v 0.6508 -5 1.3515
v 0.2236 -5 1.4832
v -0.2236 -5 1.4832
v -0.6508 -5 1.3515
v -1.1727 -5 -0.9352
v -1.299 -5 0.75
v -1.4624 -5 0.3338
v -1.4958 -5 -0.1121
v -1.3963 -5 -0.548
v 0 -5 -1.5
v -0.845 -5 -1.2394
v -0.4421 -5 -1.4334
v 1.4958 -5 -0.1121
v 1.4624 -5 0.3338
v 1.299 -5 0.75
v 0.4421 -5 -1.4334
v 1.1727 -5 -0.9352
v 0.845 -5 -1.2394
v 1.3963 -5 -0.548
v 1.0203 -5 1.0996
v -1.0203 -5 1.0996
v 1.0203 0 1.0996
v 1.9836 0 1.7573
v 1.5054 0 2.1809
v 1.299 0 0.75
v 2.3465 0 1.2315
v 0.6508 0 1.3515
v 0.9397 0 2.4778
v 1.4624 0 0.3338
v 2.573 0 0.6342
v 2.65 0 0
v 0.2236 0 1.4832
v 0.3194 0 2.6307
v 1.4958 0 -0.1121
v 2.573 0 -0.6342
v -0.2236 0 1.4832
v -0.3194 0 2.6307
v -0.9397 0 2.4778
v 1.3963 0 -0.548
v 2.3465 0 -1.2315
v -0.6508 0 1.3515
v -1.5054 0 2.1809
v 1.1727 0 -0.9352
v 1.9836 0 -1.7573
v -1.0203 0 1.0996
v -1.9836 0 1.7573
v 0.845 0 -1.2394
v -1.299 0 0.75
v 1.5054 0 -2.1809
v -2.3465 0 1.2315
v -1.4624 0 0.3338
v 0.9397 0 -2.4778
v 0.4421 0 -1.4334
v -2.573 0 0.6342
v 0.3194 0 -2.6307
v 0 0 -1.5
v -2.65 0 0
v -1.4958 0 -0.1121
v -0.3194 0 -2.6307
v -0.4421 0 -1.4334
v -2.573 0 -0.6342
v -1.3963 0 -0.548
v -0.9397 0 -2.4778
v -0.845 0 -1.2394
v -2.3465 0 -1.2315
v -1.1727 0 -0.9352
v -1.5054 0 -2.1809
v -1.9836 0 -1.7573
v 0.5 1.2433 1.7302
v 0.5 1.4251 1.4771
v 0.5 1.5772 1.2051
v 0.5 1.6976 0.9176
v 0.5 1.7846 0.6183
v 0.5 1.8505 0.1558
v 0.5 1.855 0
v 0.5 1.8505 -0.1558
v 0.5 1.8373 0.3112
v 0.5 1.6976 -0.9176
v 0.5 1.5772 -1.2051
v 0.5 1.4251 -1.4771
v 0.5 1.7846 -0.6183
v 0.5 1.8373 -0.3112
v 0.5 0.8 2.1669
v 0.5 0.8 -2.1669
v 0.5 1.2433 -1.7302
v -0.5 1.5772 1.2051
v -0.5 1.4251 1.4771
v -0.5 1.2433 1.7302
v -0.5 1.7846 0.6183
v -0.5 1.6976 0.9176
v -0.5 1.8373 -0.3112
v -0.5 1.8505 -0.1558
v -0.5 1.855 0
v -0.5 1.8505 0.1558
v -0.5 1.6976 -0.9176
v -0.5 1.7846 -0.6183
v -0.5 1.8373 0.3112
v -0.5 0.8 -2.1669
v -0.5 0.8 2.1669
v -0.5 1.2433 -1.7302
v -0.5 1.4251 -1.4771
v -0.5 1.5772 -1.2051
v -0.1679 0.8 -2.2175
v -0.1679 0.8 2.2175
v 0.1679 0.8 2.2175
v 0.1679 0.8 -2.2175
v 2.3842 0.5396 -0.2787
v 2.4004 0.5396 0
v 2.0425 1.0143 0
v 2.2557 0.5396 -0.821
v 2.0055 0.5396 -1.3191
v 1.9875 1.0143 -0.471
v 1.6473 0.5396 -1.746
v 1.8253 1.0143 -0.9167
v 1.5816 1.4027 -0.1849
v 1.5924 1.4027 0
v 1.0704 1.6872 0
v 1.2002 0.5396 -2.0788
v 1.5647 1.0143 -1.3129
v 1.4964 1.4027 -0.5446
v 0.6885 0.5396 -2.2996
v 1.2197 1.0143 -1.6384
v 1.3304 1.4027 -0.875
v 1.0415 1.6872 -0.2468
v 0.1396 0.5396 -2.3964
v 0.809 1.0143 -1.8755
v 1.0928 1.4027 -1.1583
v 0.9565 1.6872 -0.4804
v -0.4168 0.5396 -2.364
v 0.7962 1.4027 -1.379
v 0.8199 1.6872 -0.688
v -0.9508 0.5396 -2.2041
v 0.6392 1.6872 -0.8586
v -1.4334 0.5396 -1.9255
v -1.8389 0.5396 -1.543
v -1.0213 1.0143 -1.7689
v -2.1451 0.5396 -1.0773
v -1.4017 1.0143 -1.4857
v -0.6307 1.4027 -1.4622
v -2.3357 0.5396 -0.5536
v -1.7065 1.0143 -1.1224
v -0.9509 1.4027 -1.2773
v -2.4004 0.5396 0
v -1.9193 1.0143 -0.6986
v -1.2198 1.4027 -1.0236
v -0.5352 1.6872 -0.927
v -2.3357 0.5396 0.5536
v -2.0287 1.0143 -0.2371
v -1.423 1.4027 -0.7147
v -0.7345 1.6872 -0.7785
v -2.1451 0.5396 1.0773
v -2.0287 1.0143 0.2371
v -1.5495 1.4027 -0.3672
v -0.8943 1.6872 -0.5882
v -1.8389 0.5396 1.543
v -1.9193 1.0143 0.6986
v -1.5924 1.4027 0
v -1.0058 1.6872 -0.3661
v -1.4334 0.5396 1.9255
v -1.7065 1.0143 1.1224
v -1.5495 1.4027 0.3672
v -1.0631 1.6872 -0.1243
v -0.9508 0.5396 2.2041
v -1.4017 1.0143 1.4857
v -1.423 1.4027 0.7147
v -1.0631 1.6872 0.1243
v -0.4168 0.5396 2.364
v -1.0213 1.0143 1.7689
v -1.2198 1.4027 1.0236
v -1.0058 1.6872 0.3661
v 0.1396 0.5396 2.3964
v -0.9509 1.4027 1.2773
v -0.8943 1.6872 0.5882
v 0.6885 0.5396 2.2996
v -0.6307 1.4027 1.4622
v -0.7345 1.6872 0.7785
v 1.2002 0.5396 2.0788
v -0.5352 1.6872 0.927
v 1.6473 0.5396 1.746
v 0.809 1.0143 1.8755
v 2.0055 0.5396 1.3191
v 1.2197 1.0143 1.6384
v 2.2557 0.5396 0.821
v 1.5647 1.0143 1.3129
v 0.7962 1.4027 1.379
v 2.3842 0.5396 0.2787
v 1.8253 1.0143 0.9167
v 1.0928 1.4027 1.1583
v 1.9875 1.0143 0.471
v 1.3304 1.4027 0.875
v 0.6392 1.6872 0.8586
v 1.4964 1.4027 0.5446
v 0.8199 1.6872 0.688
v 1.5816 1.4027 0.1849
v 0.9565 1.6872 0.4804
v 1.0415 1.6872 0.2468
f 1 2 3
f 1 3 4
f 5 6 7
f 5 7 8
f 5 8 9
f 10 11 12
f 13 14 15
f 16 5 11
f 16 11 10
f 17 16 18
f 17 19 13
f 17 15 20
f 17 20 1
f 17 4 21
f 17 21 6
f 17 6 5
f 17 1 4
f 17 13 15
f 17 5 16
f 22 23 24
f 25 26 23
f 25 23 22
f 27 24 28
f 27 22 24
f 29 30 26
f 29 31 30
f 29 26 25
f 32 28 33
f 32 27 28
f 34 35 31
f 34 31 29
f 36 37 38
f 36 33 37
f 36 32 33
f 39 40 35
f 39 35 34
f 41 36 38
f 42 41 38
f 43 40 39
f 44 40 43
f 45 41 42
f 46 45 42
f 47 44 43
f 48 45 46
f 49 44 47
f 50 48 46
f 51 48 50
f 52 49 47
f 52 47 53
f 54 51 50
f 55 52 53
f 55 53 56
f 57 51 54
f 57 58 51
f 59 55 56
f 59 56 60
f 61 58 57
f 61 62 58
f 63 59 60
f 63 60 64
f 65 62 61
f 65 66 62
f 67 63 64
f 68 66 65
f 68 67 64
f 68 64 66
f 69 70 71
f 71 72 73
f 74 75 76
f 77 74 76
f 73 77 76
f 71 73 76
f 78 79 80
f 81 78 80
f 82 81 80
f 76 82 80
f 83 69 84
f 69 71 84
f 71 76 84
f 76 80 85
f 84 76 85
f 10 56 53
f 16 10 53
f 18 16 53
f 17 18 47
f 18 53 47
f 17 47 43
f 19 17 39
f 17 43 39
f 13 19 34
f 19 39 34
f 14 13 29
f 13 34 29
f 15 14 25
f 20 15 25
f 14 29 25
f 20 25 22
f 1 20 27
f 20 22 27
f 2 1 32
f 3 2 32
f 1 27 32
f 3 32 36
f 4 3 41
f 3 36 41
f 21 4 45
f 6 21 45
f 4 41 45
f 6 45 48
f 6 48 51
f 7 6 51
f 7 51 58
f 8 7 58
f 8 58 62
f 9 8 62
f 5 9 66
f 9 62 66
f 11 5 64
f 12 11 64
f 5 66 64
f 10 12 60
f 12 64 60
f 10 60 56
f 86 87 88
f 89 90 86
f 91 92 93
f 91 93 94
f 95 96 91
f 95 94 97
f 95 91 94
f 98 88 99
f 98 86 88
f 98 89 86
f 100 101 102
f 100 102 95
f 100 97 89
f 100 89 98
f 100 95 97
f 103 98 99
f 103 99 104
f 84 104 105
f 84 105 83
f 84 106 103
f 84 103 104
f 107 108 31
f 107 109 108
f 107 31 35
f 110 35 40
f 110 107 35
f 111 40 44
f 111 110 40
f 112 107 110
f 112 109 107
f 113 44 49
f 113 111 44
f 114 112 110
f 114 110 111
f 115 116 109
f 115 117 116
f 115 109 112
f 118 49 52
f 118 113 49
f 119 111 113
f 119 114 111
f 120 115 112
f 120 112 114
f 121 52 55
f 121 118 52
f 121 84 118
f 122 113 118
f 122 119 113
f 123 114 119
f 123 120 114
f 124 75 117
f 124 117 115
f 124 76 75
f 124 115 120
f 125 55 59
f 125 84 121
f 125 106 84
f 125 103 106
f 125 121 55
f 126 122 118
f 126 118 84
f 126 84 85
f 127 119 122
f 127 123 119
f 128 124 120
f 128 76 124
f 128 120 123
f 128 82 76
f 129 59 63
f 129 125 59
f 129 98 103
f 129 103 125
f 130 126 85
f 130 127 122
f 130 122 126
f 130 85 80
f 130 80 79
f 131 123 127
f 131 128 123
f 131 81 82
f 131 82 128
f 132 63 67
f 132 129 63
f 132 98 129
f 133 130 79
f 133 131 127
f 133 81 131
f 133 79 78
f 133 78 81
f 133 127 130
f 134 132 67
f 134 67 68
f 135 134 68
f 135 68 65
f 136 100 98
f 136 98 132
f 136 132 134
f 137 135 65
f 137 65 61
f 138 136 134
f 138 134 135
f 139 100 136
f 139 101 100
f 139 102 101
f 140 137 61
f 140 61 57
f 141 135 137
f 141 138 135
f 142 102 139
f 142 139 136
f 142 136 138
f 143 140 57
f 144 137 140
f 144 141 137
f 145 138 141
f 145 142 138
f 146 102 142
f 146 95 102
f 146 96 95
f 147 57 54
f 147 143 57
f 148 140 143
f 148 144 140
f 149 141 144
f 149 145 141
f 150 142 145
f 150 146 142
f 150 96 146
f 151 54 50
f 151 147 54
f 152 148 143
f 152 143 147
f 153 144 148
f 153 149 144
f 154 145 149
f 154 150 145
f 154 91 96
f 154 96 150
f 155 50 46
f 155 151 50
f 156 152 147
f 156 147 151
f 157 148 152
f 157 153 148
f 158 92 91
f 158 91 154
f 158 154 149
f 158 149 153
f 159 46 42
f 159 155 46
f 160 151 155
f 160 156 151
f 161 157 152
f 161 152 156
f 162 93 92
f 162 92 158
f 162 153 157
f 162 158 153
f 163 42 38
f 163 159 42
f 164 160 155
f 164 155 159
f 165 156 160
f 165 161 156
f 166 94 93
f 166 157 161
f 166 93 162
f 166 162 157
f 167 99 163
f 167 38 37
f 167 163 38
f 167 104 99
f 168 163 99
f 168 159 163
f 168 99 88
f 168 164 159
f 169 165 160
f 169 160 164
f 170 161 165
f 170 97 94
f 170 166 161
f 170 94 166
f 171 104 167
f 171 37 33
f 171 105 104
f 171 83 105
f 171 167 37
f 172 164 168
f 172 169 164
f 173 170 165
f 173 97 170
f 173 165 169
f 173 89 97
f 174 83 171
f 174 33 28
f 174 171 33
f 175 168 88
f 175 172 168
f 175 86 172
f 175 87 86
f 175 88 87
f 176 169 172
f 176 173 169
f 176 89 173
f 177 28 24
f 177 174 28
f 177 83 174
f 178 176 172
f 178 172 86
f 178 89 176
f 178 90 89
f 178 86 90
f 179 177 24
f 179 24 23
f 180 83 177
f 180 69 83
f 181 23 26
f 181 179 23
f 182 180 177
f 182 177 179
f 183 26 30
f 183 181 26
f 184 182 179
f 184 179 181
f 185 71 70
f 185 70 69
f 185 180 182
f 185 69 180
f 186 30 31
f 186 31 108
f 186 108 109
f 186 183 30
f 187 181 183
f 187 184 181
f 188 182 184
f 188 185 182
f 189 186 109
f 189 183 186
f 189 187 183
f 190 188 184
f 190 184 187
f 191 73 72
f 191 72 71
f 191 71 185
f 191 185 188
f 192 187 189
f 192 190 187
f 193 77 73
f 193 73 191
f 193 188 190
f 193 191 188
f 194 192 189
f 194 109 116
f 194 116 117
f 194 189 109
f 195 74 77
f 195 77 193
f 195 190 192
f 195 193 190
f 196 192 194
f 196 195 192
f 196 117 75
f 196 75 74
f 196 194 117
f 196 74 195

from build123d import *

# Parameters (mm, degrees)
SKETCH_2_W          = 1
SKETCH_2_H          = 5.907580982
CUT_EXTRUDE_1_DEPTH = 1.2
SKETCH_3_R          = 1.5
EXTRUDE_2_DEPTH     = 5


with BuildPart() as part:
    # Эскиз1 → Повернуть1 (revolve)
    with BuildSketch(Plane.XY):
        with BuildLine():
            Line((0, 0), (2.65, 0))
            ThreePointArc((2.65, 0), (1.630375724, 1.375918772), (0, 1.9))
            Line((0, 1.9), (0, 0))
        make_face()
    revolve(axis=Axis((0, 0, 0), (0, 1, 0)))

    # Эскиз2 → Вытянуть1 (cut)
    with BuildSketch(Plane(origin=(0, 2, 0), x_dir=(1, 0, 0), z_dir=(0, 1, 0))):
        Rectangle(SKETCH_2_W, SKETCH_2_H)
    extrude(amount=-CUT_EXTRUDE_1_DEPTH, mode=Mode.SUBTRACT)

    # Эскиз3 → Вытянуть2 (add)
    with BuildSketch(Plane.XZ):
        with Locations(Location((0, 0, 0), (0, 0, 270))):
            Circle(SKETCH_3_R)
    extrude(amount=EXTRUDE_2_DEPTH)


solid = part.part
